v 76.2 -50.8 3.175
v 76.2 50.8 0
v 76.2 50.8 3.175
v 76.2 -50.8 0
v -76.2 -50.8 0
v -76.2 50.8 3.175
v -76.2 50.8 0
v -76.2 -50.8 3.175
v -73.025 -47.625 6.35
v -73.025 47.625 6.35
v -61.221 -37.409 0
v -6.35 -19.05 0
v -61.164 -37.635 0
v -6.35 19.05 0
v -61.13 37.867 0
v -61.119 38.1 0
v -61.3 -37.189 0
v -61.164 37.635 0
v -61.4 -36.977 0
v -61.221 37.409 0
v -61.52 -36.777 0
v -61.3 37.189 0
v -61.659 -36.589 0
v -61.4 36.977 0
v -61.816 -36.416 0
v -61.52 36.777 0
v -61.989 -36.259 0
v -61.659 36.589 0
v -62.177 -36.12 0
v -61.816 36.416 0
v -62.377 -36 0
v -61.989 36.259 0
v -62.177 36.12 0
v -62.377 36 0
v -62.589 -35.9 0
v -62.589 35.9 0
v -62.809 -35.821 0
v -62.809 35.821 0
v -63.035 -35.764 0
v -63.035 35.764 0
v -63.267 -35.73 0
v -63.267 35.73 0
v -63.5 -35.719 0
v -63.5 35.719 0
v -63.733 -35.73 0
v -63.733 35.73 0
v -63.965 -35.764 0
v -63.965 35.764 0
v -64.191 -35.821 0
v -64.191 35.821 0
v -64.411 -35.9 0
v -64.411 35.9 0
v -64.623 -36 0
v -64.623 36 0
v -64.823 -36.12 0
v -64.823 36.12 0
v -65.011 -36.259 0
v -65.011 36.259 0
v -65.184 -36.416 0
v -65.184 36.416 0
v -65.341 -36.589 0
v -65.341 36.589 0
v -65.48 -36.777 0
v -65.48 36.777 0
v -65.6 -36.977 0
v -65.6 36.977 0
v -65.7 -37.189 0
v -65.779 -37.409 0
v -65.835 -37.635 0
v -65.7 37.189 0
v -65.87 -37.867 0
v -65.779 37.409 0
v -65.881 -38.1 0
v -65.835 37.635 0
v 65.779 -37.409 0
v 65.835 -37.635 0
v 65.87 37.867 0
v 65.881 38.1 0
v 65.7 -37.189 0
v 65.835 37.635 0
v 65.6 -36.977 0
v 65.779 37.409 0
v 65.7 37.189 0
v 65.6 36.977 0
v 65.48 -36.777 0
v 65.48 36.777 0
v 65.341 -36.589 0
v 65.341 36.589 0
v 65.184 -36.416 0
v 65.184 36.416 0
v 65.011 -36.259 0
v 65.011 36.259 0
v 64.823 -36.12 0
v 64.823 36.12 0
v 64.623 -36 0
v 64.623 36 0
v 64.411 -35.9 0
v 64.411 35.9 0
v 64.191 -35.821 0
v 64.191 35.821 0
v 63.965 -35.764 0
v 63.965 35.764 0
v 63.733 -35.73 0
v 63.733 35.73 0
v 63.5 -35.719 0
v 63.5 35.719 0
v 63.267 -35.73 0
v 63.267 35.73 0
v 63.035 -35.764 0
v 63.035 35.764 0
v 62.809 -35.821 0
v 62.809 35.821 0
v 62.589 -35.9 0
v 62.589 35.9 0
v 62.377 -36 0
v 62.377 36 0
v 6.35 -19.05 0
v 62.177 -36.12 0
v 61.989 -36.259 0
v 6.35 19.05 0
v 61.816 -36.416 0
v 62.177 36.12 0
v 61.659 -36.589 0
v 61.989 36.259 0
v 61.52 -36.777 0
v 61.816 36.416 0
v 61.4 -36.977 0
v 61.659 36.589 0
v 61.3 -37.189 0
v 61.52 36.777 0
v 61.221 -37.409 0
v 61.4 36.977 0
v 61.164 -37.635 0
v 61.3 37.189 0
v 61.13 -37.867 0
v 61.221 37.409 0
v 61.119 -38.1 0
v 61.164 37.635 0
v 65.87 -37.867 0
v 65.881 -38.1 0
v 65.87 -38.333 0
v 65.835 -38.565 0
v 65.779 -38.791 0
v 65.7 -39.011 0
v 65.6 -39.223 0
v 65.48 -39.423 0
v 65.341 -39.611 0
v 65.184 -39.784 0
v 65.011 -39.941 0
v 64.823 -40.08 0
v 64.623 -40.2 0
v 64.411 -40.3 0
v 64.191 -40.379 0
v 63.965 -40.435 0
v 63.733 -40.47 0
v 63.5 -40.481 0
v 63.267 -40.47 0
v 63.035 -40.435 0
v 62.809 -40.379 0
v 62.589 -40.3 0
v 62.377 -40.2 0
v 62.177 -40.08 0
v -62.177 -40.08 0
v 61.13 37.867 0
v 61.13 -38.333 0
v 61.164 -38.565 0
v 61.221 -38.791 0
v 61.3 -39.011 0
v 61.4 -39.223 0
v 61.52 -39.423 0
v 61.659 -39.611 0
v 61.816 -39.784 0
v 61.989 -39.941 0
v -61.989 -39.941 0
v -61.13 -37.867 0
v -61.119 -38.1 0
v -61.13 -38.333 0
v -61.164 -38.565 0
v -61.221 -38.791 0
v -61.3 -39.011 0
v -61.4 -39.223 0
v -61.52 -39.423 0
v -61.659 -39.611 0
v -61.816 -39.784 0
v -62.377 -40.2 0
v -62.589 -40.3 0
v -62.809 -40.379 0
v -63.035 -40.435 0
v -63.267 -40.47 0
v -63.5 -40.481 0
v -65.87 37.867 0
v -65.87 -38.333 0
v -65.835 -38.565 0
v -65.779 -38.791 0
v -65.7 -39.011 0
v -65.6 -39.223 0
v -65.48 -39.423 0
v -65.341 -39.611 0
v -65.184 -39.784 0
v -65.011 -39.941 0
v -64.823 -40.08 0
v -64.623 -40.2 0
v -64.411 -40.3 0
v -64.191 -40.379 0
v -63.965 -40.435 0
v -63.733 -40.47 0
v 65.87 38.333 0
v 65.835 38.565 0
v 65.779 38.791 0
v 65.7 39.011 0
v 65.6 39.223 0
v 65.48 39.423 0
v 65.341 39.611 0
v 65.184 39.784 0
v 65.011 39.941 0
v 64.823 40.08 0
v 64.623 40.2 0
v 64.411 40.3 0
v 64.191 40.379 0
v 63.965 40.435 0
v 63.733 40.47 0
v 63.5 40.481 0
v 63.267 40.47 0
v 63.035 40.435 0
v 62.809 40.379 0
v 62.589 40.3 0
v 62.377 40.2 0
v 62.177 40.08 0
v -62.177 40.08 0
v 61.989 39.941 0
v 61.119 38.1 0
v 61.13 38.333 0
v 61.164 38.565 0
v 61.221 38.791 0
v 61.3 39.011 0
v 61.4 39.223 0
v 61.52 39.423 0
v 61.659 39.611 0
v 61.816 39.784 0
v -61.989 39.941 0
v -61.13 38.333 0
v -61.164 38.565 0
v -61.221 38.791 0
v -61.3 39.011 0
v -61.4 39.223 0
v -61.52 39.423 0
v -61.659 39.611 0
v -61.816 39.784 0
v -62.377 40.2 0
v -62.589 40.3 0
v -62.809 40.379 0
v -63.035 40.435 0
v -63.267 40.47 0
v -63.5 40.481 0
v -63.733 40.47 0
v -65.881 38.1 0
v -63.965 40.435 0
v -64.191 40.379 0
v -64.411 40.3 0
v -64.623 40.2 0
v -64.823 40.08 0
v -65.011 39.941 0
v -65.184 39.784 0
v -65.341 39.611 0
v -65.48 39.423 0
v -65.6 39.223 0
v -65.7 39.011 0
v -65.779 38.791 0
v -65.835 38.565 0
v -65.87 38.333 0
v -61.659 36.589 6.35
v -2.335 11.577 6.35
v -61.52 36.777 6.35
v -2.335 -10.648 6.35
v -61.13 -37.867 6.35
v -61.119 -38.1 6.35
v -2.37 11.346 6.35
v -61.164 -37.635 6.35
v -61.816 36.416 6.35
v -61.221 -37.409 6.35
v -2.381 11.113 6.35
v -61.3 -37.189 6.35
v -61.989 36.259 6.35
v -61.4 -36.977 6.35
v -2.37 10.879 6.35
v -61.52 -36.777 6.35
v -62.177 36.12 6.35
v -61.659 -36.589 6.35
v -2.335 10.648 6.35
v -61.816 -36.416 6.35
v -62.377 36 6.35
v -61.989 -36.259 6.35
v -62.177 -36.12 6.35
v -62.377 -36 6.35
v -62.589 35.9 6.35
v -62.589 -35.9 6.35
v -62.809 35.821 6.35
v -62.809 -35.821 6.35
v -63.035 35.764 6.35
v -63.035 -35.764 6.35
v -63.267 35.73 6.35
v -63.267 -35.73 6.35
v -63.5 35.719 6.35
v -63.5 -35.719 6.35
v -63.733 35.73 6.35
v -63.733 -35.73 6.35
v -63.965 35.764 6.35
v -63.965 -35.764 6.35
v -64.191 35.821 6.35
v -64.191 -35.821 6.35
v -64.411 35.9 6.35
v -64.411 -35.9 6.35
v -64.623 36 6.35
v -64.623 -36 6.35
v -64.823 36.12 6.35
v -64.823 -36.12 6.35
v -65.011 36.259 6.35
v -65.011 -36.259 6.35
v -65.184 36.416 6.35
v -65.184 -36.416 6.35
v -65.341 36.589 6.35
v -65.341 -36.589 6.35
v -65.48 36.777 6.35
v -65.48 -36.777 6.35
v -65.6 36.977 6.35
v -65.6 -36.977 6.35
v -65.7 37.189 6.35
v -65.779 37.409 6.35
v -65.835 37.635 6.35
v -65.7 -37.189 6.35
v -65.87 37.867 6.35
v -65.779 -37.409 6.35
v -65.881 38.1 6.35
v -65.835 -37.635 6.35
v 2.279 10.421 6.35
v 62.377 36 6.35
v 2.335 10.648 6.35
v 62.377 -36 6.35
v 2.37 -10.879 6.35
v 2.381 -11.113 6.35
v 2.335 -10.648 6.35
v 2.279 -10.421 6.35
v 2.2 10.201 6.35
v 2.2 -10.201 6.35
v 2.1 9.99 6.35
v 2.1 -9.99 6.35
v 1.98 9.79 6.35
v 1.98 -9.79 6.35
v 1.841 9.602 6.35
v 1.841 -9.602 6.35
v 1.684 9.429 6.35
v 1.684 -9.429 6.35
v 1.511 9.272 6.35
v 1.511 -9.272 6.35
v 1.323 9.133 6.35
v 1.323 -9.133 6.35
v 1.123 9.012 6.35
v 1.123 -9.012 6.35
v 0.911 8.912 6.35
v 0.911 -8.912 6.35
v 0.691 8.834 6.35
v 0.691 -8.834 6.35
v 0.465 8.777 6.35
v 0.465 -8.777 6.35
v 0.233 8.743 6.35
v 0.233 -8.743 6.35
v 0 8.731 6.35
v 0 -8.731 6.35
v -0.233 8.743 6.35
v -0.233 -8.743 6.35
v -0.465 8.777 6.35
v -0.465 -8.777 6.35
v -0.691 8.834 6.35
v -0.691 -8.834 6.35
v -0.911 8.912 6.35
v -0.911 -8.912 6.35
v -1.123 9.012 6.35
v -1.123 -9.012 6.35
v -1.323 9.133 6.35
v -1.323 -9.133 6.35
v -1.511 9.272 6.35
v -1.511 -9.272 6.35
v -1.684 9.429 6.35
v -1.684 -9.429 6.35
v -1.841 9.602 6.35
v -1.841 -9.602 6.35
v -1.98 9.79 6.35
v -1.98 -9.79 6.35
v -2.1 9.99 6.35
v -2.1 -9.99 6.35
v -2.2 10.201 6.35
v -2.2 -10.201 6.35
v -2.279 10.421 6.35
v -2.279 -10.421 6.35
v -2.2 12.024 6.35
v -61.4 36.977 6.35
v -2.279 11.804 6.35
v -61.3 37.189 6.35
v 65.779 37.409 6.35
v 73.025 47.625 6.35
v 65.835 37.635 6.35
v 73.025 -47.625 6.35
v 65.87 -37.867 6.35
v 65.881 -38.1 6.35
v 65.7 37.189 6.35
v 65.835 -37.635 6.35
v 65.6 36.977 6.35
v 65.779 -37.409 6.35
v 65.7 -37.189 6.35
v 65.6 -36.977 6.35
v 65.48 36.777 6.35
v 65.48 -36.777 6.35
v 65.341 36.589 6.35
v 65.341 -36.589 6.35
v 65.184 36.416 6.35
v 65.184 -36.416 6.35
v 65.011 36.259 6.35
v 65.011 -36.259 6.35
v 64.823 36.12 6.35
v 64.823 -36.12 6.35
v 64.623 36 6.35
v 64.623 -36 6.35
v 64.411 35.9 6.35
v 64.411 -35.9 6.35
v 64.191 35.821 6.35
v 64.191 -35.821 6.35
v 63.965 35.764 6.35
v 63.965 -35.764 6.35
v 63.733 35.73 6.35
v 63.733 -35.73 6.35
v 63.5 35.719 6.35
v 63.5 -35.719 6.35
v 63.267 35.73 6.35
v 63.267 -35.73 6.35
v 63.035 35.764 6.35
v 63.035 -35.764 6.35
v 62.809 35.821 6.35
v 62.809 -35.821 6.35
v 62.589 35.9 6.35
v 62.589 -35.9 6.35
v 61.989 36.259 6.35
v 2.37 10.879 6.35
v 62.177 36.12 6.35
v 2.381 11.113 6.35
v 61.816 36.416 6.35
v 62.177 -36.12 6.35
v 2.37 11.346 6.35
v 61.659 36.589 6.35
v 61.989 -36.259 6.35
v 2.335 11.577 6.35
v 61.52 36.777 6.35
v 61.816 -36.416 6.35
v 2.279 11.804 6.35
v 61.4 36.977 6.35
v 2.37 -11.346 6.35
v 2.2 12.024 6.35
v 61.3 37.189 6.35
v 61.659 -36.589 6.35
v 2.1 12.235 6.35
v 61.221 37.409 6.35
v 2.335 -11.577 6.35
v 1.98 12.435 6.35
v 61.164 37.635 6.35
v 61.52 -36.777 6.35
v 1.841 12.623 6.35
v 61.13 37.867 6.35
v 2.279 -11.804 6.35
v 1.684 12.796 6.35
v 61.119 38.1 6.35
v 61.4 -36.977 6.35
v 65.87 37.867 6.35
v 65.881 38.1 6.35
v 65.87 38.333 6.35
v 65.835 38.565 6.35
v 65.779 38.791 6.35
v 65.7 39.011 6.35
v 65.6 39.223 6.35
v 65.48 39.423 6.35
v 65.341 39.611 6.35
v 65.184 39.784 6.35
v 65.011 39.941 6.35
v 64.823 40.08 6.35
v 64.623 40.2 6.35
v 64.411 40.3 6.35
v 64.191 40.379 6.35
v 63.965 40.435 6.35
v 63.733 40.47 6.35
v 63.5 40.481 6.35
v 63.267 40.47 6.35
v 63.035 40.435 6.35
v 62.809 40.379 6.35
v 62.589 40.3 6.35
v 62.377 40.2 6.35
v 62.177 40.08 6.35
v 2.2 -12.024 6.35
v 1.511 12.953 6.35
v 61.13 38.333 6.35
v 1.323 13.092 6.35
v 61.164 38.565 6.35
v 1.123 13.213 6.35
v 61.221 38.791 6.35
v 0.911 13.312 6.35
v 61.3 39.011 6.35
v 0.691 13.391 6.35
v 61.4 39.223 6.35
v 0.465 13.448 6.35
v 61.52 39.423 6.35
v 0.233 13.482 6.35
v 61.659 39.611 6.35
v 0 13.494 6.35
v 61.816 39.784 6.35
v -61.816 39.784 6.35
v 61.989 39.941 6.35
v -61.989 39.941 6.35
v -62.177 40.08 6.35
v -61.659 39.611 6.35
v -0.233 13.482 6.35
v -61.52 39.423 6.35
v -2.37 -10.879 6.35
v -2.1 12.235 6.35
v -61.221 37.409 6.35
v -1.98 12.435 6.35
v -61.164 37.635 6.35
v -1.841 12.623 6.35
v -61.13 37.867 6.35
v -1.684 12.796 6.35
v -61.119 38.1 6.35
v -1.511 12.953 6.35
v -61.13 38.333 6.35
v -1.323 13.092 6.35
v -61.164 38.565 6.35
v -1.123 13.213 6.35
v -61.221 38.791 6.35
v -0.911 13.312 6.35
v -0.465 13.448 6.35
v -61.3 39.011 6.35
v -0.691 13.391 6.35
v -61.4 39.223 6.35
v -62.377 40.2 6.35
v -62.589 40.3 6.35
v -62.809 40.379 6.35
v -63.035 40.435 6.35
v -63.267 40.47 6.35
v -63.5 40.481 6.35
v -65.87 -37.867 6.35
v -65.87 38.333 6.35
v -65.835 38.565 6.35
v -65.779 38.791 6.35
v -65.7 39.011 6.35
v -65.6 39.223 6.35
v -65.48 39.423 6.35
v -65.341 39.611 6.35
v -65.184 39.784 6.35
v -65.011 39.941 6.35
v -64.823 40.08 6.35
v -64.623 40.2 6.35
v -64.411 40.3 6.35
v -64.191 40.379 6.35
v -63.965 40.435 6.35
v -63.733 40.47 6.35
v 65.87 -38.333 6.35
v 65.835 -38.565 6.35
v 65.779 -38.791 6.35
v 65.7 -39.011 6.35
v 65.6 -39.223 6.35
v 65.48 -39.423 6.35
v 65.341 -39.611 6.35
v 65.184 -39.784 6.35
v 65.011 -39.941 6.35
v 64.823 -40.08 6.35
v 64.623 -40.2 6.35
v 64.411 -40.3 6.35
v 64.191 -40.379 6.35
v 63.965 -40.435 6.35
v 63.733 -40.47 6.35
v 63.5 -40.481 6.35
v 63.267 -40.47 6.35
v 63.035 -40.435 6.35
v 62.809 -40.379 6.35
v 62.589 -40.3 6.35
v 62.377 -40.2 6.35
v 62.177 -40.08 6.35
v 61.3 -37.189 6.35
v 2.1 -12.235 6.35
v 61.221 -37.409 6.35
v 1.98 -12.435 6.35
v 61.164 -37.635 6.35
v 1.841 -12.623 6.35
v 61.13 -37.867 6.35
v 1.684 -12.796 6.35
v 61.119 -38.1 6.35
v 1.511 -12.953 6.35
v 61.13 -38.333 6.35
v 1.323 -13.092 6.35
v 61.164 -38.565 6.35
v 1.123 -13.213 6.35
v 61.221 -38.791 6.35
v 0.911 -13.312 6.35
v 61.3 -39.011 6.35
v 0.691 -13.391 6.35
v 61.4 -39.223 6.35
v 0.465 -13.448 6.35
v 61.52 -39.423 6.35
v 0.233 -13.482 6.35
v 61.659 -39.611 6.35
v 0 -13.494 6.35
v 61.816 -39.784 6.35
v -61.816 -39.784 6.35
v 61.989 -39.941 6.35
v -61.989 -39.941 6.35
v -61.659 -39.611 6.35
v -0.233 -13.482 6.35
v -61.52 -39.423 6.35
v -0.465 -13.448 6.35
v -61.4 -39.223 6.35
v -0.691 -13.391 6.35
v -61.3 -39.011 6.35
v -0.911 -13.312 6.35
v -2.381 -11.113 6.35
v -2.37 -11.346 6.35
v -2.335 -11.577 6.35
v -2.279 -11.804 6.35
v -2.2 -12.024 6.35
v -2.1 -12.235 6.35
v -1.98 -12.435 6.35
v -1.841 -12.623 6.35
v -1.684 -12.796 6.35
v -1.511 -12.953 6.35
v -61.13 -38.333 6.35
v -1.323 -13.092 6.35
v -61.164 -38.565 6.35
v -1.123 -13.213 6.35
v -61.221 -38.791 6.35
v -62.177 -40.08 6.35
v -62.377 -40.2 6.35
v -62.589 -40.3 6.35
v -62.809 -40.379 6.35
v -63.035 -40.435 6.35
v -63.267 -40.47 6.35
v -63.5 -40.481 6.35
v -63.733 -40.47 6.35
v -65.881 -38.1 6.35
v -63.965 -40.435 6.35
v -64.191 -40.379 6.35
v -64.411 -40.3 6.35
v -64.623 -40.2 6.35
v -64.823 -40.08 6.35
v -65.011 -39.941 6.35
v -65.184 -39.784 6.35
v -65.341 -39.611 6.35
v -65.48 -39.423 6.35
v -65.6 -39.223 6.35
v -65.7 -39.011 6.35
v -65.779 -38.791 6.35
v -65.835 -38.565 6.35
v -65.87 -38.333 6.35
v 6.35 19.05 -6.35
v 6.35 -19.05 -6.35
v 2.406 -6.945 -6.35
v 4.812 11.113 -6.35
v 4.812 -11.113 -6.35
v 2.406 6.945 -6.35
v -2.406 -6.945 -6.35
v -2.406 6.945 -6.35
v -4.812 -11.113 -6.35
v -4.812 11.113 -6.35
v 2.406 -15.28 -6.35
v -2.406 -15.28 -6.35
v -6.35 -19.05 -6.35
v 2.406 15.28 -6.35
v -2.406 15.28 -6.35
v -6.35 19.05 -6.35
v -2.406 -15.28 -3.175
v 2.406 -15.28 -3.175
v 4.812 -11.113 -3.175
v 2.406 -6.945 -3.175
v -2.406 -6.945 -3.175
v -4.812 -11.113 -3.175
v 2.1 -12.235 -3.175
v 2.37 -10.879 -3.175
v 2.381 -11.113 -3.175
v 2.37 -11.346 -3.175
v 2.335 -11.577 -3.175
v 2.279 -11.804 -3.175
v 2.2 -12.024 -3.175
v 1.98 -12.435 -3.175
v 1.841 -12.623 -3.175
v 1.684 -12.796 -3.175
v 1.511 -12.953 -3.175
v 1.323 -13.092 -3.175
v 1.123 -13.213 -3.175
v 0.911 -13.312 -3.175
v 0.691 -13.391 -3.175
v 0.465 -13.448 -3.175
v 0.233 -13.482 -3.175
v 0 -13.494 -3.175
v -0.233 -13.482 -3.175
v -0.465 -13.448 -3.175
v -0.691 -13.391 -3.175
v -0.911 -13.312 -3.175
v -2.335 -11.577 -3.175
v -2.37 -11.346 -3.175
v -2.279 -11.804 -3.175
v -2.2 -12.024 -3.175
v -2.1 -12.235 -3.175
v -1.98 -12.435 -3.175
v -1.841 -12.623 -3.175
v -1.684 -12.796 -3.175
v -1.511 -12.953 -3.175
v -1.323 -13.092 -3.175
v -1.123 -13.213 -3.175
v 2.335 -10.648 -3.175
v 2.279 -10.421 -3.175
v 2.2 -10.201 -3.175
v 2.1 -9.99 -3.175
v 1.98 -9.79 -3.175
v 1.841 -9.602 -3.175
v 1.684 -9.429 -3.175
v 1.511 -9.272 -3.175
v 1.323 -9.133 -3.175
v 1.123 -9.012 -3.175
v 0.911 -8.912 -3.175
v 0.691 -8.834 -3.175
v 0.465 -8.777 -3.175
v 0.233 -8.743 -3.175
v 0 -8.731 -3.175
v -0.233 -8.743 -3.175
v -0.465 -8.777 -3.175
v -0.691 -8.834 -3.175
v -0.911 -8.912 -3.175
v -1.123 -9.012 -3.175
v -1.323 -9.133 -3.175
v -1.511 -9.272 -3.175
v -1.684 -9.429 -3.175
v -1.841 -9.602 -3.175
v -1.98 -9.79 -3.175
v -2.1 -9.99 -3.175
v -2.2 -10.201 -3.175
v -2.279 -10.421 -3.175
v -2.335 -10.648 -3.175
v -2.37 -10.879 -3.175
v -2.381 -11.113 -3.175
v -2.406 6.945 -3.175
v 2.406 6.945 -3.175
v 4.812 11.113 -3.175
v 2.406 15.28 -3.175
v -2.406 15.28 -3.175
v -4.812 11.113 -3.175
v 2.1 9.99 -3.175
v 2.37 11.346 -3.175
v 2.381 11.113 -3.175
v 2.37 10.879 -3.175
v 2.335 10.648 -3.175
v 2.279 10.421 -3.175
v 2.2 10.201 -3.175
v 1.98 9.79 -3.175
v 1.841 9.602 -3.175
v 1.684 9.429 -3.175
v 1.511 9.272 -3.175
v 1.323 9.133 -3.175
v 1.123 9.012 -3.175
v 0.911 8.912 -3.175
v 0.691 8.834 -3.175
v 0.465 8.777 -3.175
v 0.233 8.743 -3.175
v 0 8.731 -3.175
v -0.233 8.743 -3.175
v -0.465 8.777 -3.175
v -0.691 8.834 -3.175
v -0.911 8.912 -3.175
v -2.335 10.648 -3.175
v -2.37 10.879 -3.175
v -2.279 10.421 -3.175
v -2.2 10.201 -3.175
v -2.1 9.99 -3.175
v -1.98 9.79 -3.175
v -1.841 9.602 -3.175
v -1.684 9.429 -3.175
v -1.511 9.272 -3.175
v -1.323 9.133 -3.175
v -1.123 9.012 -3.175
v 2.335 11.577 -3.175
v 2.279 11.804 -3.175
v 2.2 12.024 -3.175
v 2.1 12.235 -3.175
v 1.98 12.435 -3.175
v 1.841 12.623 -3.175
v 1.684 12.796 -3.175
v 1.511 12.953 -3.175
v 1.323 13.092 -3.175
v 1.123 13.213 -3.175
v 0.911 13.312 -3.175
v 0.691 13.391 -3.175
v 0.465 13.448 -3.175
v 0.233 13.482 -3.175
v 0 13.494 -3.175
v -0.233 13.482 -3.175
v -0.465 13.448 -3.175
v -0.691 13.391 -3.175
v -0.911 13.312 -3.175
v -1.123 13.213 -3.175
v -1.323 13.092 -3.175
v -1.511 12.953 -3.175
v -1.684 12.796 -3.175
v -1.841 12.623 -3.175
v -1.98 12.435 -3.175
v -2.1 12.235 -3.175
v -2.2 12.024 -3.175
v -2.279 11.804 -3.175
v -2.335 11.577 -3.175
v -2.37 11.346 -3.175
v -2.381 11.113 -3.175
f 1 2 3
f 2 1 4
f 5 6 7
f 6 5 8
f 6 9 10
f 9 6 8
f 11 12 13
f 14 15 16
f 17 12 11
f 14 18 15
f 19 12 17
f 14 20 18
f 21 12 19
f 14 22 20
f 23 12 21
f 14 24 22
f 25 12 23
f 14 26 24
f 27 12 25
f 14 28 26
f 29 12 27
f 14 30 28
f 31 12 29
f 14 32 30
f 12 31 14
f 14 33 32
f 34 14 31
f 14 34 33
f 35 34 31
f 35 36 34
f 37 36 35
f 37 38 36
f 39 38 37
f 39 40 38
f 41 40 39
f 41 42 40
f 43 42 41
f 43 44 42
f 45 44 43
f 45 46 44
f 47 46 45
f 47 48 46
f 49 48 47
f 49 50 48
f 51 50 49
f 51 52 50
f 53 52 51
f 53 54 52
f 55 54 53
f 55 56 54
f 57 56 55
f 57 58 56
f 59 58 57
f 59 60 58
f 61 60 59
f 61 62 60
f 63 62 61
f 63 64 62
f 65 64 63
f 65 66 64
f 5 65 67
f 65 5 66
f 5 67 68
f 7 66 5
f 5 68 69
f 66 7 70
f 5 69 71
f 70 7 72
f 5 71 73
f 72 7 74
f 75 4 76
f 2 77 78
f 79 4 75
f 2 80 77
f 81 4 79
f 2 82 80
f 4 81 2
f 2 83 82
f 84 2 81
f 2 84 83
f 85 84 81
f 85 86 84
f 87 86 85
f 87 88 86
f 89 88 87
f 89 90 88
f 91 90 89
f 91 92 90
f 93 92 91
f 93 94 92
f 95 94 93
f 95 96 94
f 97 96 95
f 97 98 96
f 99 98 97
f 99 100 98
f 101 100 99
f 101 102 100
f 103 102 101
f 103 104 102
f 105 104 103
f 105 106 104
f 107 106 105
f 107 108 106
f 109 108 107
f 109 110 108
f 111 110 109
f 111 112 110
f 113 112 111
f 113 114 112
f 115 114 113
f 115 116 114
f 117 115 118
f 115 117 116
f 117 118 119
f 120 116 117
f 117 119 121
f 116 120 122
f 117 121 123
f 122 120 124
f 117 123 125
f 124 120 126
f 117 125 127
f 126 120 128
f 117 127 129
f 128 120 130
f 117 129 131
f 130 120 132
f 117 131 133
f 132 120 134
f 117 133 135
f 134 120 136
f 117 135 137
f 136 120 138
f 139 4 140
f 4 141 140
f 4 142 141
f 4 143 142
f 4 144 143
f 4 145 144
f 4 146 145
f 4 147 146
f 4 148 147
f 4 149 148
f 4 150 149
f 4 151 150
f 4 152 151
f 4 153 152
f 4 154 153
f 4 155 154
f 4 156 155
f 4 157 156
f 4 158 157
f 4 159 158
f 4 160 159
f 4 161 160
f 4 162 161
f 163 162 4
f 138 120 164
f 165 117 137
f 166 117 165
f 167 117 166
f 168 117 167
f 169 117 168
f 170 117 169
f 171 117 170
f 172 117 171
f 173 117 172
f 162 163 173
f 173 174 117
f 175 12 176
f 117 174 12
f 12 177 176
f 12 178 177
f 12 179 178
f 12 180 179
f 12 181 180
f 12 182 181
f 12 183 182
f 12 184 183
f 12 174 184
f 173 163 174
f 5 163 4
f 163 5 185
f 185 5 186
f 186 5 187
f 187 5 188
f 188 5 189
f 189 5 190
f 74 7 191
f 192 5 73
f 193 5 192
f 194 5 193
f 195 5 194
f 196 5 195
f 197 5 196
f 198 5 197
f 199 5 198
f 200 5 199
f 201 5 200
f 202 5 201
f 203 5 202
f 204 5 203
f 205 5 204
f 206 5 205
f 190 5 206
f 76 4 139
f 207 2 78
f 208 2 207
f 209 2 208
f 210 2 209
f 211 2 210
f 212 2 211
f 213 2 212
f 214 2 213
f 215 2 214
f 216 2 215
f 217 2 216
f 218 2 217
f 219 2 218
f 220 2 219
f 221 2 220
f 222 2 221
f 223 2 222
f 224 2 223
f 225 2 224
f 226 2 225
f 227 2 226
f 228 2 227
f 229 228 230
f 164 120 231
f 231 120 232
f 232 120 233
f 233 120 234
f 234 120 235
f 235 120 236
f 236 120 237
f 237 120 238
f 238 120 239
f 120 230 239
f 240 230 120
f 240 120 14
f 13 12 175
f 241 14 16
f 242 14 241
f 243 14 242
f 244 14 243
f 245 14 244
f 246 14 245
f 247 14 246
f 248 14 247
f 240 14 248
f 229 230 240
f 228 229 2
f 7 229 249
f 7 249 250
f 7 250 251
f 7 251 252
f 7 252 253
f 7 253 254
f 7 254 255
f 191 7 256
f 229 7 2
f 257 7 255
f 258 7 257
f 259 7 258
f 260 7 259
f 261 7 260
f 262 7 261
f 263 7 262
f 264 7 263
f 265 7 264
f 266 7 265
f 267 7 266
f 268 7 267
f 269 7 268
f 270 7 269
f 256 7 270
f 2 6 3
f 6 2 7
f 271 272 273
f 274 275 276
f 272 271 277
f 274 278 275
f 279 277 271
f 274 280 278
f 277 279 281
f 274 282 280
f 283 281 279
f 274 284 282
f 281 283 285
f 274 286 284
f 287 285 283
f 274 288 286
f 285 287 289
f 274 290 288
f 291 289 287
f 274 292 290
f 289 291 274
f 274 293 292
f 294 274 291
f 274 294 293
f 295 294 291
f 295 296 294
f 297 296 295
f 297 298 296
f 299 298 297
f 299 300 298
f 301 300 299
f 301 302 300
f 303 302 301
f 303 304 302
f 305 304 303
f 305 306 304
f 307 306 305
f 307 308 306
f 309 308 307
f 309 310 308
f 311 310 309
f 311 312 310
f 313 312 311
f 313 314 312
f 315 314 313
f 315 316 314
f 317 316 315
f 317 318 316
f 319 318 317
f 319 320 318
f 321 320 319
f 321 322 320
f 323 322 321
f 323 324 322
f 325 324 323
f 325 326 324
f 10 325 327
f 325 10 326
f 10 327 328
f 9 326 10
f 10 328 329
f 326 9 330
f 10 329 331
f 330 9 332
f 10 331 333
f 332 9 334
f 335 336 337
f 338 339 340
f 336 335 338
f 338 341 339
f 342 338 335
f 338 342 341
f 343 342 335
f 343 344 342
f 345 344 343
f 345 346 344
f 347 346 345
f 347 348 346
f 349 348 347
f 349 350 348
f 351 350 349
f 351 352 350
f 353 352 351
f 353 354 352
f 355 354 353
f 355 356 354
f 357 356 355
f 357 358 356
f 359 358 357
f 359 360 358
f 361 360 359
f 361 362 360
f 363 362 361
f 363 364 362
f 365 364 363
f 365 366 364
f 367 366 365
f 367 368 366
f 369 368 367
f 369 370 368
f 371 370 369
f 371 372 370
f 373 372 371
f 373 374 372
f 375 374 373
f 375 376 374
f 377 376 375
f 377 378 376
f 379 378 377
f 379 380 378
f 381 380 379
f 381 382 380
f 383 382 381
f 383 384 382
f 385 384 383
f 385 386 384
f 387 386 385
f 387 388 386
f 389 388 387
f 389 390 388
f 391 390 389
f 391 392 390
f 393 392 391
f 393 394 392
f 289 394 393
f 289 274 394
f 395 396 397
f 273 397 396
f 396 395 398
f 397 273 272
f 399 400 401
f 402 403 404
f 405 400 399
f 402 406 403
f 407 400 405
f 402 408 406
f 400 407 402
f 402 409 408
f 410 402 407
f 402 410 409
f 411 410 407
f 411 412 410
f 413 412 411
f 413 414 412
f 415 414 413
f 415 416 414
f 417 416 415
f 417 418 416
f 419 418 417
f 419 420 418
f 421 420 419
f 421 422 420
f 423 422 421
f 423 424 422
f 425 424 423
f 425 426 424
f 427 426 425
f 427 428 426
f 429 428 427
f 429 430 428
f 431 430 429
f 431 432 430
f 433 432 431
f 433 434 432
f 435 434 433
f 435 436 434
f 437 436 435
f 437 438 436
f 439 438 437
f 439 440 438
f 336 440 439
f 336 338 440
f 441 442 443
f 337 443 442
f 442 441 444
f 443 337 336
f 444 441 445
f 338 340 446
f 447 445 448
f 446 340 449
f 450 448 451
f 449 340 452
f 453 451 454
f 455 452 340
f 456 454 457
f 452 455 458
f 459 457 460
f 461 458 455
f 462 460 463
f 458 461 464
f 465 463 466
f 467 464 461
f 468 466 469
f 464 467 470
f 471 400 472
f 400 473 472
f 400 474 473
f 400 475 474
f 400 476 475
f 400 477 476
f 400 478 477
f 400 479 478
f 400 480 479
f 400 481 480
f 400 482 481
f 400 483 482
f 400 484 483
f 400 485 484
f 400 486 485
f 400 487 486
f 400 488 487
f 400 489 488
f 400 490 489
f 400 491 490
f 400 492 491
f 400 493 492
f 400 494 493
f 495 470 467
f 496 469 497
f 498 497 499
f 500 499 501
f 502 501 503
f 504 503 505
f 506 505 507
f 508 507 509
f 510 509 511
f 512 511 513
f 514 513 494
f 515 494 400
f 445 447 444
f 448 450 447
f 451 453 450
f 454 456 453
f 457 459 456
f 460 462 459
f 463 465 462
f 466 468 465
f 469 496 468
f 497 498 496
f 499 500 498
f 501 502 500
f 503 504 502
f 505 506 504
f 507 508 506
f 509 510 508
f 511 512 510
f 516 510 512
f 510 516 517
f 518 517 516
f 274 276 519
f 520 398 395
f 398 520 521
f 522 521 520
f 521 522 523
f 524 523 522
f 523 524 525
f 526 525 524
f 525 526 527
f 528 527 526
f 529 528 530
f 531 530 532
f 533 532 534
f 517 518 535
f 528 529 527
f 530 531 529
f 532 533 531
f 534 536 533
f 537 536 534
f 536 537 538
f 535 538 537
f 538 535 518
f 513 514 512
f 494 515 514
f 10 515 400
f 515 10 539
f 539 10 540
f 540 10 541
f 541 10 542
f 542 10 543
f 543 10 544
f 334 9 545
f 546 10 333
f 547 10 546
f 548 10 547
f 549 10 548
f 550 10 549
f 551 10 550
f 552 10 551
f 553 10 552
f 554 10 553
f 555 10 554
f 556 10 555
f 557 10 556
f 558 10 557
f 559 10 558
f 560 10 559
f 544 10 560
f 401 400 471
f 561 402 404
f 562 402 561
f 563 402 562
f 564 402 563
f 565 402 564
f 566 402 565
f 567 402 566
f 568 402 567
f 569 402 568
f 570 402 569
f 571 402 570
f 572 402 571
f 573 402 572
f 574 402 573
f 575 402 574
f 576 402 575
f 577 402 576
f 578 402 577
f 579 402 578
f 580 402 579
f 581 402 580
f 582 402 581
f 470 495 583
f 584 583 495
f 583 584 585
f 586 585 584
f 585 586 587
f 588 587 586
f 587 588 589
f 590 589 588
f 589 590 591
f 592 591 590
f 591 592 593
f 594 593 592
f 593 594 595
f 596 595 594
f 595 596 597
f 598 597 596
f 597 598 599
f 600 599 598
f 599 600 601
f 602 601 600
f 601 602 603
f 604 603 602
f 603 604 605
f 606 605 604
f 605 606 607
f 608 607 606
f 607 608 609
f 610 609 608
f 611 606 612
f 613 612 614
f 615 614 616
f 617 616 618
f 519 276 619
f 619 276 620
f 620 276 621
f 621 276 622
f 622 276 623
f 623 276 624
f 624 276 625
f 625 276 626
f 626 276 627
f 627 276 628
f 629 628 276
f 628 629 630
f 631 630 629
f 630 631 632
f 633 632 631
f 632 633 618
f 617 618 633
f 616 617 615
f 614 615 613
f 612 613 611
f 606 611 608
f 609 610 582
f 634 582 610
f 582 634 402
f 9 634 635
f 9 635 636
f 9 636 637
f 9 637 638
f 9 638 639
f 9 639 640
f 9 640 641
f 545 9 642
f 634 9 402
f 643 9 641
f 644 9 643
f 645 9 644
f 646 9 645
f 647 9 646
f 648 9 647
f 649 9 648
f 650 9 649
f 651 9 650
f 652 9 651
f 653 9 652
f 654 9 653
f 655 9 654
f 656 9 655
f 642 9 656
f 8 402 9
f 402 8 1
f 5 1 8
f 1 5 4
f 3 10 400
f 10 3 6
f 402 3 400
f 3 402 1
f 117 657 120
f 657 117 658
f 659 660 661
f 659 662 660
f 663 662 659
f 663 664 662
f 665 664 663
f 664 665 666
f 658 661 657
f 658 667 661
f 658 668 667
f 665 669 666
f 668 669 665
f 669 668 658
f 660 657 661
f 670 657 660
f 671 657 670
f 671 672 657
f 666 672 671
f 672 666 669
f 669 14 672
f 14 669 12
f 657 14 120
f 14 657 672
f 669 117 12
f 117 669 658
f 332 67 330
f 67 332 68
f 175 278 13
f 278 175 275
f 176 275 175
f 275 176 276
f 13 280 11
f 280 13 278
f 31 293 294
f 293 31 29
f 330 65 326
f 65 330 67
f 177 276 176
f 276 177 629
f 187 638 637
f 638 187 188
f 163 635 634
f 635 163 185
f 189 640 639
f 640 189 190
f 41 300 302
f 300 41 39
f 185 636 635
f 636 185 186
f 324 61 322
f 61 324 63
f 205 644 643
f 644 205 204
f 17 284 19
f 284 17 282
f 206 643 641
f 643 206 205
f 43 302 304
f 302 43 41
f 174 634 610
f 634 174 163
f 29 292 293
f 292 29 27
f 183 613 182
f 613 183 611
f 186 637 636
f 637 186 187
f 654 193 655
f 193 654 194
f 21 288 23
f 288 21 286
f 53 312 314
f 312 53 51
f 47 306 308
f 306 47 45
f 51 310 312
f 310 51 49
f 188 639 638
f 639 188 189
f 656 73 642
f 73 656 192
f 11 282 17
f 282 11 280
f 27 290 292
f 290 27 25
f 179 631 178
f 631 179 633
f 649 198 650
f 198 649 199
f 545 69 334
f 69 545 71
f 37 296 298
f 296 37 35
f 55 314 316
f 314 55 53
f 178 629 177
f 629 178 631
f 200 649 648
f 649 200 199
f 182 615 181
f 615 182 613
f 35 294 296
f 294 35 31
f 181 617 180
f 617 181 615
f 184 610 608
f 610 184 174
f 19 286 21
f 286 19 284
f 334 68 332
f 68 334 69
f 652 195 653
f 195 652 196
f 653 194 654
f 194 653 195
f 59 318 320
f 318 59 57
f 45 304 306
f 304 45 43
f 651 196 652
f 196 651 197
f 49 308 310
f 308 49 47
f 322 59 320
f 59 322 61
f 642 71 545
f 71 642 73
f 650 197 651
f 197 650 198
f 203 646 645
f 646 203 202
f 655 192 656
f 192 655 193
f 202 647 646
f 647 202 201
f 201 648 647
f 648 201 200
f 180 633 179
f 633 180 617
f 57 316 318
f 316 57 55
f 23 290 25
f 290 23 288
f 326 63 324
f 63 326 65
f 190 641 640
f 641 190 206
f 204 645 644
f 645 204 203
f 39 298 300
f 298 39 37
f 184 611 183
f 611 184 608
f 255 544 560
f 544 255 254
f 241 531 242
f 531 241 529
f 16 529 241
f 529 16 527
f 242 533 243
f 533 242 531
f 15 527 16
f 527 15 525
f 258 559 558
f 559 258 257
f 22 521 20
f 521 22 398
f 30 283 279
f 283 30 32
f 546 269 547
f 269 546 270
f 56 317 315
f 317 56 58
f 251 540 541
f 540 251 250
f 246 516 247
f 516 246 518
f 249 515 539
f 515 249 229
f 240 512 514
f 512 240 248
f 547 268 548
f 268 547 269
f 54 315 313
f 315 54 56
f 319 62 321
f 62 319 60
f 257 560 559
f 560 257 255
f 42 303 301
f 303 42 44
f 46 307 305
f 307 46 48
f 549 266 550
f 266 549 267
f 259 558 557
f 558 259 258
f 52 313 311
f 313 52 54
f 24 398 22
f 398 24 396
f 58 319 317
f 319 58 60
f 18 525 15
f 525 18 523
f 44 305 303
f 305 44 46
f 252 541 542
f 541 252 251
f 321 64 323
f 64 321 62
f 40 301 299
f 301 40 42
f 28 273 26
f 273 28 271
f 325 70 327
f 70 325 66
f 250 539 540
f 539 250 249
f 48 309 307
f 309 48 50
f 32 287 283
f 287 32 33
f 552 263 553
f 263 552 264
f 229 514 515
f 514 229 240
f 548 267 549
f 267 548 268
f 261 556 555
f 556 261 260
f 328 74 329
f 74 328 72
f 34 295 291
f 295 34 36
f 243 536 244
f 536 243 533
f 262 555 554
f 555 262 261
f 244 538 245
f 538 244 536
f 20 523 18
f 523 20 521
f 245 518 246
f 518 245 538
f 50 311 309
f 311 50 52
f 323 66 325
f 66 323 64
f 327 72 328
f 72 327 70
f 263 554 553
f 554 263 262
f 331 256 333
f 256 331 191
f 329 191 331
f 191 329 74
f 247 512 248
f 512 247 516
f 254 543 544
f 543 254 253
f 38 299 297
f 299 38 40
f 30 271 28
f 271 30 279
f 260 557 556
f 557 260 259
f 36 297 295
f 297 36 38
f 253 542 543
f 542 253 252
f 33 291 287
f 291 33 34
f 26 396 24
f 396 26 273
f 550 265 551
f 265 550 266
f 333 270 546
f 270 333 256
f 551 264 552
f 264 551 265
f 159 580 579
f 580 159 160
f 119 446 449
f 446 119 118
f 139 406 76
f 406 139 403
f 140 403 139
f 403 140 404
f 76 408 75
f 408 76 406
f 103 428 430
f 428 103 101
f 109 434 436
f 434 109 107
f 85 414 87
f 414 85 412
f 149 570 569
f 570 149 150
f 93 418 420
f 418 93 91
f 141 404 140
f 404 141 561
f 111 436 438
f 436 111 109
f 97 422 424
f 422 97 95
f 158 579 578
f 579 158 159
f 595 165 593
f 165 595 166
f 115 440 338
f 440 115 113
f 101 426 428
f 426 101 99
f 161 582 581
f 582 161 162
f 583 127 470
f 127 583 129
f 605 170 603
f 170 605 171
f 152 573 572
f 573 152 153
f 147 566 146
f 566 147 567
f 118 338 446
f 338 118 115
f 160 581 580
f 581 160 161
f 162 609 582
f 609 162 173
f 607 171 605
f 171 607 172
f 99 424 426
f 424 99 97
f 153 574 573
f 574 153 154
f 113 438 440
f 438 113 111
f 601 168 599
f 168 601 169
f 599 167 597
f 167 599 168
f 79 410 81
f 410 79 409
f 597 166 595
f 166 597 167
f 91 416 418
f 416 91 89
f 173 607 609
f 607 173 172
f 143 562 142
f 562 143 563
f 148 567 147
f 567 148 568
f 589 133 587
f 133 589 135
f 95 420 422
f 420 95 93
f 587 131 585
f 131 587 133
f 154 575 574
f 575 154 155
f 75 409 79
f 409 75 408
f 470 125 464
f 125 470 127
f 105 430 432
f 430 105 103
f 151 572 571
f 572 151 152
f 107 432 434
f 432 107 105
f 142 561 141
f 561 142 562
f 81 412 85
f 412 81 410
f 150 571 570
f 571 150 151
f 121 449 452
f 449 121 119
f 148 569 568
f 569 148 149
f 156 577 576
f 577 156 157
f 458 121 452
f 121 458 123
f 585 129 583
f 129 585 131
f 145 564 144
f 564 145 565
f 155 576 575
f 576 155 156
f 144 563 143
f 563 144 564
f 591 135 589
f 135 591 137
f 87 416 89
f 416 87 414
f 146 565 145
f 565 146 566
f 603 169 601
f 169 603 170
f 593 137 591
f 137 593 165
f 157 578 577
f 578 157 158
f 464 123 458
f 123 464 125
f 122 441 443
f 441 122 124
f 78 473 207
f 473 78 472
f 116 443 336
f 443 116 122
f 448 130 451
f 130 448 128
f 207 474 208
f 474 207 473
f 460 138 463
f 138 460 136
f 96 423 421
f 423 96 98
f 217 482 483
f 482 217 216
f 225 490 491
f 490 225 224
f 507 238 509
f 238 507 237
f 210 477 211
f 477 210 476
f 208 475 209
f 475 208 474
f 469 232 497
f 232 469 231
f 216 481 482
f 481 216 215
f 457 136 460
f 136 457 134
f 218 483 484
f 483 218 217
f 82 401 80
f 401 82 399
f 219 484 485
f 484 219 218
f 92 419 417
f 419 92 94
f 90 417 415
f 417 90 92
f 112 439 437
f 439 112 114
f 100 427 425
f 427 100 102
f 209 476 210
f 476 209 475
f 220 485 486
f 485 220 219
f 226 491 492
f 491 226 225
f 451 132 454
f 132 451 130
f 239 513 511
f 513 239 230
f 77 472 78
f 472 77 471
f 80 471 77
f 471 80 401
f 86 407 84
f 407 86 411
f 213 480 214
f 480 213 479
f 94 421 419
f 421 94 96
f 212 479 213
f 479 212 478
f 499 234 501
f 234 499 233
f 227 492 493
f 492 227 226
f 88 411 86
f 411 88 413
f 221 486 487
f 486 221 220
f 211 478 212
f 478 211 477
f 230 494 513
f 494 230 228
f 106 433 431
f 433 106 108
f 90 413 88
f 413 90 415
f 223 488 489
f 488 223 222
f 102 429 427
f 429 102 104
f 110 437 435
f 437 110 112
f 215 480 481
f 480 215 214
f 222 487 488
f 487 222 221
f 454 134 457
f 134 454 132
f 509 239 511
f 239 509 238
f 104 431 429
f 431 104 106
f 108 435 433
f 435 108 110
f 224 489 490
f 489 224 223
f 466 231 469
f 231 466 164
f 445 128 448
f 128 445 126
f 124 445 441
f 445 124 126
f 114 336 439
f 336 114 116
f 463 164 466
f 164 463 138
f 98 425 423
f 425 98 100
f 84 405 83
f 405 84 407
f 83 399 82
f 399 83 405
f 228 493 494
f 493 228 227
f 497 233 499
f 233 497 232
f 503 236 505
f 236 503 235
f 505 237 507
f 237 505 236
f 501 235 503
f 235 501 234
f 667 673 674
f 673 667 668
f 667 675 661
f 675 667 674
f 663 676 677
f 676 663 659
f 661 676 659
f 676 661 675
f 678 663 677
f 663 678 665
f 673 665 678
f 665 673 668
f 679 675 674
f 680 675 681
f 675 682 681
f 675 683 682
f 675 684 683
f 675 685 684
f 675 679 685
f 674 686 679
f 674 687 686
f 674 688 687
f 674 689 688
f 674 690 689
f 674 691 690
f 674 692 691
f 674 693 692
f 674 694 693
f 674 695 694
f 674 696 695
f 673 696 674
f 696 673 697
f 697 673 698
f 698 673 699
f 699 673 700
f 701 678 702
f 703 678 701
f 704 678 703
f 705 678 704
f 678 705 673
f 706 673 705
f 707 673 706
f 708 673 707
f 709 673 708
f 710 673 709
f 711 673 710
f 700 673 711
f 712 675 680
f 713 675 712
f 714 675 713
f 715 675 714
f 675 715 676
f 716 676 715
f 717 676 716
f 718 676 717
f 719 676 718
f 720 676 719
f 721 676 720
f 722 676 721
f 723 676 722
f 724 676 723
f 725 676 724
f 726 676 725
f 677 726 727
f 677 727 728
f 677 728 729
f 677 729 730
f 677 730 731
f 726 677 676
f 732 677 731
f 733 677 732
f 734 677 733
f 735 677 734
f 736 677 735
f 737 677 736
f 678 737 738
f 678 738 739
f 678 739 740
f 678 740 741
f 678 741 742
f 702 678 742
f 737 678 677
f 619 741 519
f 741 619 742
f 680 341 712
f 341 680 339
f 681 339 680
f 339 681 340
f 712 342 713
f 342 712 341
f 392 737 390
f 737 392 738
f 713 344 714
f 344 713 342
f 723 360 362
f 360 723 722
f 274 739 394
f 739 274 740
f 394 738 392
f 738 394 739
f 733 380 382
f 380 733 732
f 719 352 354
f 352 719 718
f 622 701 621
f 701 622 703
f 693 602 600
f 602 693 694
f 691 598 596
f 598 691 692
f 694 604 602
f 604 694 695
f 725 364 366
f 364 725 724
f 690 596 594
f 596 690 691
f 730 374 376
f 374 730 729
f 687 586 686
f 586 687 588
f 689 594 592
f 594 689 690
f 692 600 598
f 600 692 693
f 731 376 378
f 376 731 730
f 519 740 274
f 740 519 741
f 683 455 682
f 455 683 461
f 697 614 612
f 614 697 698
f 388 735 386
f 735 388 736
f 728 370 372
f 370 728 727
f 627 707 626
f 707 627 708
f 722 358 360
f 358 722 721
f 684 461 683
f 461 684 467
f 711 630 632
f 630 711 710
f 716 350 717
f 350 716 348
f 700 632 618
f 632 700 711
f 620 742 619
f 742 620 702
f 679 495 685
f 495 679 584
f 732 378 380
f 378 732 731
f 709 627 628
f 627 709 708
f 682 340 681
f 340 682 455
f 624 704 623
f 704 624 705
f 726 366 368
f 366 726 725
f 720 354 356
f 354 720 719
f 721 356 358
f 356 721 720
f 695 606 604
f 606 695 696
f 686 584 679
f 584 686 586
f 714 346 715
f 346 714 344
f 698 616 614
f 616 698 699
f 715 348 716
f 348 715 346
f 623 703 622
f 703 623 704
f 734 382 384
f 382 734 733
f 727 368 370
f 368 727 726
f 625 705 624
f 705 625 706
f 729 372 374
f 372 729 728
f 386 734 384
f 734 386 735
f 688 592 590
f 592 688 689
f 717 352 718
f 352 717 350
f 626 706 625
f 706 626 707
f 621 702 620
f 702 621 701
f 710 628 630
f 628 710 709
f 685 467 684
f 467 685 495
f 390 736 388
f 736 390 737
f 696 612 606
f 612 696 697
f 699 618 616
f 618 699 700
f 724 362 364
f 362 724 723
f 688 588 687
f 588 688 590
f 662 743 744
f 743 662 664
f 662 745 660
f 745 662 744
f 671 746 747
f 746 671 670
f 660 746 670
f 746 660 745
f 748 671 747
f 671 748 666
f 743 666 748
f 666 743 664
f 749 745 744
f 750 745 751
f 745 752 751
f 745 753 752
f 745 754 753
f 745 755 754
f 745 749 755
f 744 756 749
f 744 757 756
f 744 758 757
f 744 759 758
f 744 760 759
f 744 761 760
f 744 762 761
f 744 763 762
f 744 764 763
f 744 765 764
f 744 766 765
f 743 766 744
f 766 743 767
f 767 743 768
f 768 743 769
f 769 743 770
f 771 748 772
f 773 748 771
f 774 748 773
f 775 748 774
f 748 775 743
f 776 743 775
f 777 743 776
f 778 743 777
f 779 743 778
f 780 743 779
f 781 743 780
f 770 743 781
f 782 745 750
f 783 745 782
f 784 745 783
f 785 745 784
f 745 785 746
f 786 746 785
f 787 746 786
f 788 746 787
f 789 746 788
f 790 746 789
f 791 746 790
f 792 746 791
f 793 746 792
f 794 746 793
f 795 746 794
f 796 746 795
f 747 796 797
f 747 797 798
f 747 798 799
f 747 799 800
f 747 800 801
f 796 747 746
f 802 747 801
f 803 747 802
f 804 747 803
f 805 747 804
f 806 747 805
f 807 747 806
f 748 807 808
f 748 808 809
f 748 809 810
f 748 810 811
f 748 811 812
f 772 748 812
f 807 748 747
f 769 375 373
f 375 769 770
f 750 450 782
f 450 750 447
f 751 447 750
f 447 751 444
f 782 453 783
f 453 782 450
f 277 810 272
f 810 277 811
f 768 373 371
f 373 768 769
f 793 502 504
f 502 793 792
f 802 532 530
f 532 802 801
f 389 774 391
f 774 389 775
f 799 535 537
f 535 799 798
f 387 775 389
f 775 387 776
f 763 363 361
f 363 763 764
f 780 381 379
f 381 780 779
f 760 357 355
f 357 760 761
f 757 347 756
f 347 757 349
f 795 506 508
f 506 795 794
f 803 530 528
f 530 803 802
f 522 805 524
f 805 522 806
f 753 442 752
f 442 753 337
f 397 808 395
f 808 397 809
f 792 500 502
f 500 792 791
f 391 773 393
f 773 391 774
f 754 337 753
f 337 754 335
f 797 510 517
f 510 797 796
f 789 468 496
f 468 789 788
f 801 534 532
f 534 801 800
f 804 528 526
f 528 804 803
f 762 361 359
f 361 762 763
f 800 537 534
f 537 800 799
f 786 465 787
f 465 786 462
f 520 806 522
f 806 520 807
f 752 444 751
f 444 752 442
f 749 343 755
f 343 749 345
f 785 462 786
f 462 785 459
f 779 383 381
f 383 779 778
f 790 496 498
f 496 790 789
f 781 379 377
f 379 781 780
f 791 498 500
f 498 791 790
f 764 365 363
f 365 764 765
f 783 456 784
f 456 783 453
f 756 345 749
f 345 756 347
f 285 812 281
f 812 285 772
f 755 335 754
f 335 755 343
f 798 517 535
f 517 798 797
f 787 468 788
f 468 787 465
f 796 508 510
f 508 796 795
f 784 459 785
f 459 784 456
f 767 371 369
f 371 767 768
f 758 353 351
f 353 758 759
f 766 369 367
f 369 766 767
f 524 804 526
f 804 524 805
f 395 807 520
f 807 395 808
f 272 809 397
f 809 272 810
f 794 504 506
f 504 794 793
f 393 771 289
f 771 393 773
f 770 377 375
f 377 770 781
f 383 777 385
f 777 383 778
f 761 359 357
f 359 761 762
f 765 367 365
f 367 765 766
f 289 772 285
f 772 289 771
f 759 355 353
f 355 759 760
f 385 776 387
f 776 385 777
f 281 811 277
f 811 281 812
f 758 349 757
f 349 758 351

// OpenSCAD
/* [Dimensions] */
plate_width = 6.0;       // Width of the mounting plate in inches
plate_height = 4.0;      // Height of the mounting plate in inches
plate_thickness = 0.25;  // Thickness of the mounting plate in inches
chamfer_size = 0.125;    // Chamfer size along top edges in inches

/* [Mounting Holes] */
screw_hole_diameter = 0.1875;  // Diameter of screw clearance holes in inches (#8 screw diameter ~5/32")
hole_side_margin = 0.5;        // Distance from side edge to screw hole centers in inches
holes_per_column = 2;          // Number of screw holes per side column [1:1:10]
hole_spacing = 3.0;            // Vertical center-to-center spacing between outermost holes in inches

/* [Hex Nut Boss] */
boss_height = 1.5;             // Height of the boss block in inches
boss_width = 0.5;              // Width of the boss block in inches
boss_thickness = 0.25;         // Thickness of the boss block in inches
boss_x_offset = 0.0;           // Offset of the boss along X axis from center in inches
hex_nut_flats_dia = 0.328125;  // Distance across flats for hex nut in inches
hex_nut_depth = 0.125;         // Depth of hex nut pocket in inches
hex_nut_count = 2;             // Number of hex nut pockets [1:1:10]
hex_nut_spacing = 0.875;       // Vertical center-to-center spacing between outermost hex nuts in inches

/* [Hidden] */
$fn = 64;
EPSILON = 0.01;
INCH_TO_MM = 25.4;

module chamfered_plate(width = plate_width, height = plate_height, thickness = plate_thickness, chamfer = chamfer_size) {
  if (chamfer > 0 && chamfer < min(width / 2, height / 2, thickness)) {
    hull() {
      translate([0, 0, (thickness - chamfer) / 2])
        cube([width, height, thickness - chamfer], center = true);
      translate([0, 0, thickness - EPSILON / 2])
        cube([width - 2 * chamfer, height - 2 * chamfer, EPSILON], center = true);
    }
  } else {
    translate([0, 0, thickness / 2])
      cube([width, height, thickness], center = true);
  }
}

module mounting_hole_pattern(width = plate_width, thickness = plate_thickness, hole_dia = screw_hole_diameter, side_margin = hole_side_margin, count = holes_per_column, spacing = hole_spacing) {
  x_positions = [-width / 2 + side_margin, width / 2 - side_margin];

  for (x = x_positions) {
    if (count <= 1) {
      translate([x, 0, -EPSILON])
        cylinder(d = hole_dia, h = thickness + 2 * EPSILON);
    } else {
      for (i = [0 : count - 1]) {
        y = -spacing / 2 + i * (spacing / (count - 1));
        translate([x, y, -EPSILON])
          cylinder(d = hole_dia, h = thickness + 2 * EPSILON);
      }
    }
  }
}

module hex_nut_boss(width = boss_width, height = boss_height, thickness = boss_thickness, x_offset = boss_x_offset) {
  translate([x_offset, 0, -thickness / 2])
    cube([width, height, thickness], center = true);
}

module hex_nut_boss_pattern(thickness = boss_thickness, plate_thick = plate_thickness, x_offset = boss_x_offset, flats_dia = hex_nut_flats_dia, nut_depth = hex_nut_depth, count = hex_nut_count, spacing = hex_nut_spacing, screw_dia = screw_hole_diameter) {
  hex_outer_dia = flats_dia / cos(30);

  if (count <= 1) {
    translate([x_offset, 0, -thickness - EPSILON])
      cylinder(d = hex_outer_dia, h = nut_depth + EPSILON, $fn = 6);
    translate([x_offset, 0, -thickness - EPSILON])
      cylinder(d = screw_dia, h = thickness + plate_thick + 2 * EPSILON);
  } else {
    for (i = [0 : count - 1]) {
      y = -spacing / 2 + i * (spacing / (count - 1));
      translate([x_offset, y, -thickness - EPSILON])
        cylinder(d = hex_outer_dia, h = nut_depth + EPSILON, $fn = 6);
      translate([x_offset, y, -thickness - EPSILON])
        cylinder(d = screw_dia, h = thickness + plate_thick + 2 * EPSILON);
    }
  }
}

module curtain_rod_mounting_plate() {
  difference() {
    union() {
      chamfered_plate();
      hex_nut_boss();
    }
    mounting_hole_pattern();
    hex_nut_boss_pattern();
  }
}

// Convert from inch design units to standard millimeters for 3D printing
scale([INCH_TO_MM, INCH_TO_MM, INCH_TO_MM]) {
  curtain_rod_mounting_plate();
}
